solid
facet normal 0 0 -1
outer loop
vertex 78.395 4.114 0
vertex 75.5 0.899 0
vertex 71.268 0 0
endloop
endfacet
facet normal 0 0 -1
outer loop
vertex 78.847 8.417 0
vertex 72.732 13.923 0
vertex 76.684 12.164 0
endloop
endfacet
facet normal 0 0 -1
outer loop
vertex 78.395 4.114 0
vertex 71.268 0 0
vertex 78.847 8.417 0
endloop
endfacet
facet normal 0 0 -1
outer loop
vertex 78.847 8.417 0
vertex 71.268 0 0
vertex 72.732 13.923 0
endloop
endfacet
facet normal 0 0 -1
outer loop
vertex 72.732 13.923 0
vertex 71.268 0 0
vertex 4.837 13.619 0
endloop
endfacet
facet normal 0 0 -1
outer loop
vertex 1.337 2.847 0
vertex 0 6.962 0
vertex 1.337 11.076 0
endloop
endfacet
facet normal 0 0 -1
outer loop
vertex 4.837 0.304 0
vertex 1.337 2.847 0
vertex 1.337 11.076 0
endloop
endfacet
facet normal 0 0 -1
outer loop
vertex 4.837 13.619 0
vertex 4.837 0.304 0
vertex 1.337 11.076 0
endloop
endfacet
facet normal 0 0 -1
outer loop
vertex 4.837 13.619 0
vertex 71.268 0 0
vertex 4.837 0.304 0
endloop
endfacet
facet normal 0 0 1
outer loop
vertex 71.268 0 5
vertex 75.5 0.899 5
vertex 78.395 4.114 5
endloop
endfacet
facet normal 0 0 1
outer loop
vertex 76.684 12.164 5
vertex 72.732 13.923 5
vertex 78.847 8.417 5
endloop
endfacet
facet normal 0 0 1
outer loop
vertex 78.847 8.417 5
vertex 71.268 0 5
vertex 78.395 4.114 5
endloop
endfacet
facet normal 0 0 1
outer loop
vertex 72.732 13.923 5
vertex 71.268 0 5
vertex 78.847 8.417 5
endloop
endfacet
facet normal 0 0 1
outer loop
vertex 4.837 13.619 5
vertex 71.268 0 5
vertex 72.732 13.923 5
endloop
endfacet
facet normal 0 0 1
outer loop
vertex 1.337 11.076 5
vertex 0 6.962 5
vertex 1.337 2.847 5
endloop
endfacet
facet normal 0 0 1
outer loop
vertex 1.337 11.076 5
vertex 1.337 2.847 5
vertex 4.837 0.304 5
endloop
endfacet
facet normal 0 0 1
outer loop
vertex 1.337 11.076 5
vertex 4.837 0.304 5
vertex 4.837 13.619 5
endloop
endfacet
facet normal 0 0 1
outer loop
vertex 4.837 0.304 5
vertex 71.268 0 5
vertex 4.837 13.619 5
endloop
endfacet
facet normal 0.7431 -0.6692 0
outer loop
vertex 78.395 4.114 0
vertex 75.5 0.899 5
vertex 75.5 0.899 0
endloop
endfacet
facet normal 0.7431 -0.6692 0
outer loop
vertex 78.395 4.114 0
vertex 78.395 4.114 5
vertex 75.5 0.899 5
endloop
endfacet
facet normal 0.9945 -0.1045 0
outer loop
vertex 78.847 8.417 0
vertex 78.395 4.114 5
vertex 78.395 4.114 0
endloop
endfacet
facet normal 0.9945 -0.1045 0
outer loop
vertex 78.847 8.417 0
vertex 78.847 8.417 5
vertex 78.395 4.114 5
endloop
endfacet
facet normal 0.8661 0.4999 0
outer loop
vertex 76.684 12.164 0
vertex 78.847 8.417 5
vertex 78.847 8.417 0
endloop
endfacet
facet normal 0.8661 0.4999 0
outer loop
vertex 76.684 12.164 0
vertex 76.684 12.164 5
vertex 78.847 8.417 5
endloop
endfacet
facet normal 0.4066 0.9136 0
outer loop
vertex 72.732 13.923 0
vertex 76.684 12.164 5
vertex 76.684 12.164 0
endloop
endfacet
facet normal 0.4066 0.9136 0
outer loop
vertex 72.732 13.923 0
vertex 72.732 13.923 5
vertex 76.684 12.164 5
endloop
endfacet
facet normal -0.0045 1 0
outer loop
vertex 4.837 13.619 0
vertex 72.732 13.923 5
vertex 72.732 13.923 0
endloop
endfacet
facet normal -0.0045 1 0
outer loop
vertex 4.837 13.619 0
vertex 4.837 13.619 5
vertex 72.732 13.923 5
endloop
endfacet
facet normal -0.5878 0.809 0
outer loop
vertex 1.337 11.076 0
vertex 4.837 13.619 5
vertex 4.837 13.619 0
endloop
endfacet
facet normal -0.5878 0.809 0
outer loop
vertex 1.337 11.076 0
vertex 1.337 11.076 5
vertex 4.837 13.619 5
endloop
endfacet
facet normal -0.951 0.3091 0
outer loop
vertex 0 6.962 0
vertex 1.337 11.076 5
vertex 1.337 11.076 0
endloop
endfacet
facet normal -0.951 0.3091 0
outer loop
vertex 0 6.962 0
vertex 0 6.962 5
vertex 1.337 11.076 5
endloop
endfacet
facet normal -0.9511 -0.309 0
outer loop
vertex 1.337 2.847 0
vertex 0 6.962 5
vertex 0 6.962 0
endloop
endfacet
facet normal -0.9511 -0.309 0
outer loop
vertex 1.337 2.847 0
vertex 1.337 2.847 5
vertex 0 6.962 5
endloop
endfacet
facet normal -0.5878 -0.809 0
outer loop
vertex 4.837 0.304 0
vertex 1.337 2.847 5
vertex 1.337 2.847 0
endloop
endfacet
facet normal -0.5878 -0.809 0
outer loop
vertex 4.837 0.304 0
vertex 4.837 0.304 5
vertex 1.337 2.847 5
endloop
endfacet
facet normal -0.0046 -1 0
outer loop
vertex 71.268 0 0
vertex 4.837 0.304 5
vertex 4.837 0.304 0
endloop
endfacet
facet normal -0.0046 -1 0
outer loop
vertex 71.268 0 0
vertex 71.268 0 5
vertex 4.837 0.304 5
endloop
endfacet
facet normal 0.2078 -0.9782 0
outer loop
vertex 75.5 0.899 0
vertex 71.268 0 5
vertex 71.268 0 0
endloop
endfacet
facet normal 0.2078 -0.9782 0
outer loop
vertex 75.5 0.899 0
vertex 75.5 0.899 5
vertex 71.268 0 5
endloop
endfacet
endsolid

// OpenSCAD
$fn = 32;

// ----------------------------------------------------------------------
// Lever arm: two bosses 14 and 14 mm, 65 mm between centres
// ----------------------------------------------------------------------

// --- parameters (mm) ---
profile_height = 5;       // extrusion height
profile_points = 11;      // points of the closed outline

profile = [[0, 6.962], [1.337, 2.847], [4.837, 0.304], [71.268, 0], [75.5, 0.899], [78.395, 4.114], [78.847, 8.417], [76.684, 12.164], [72.732, 13.923], [4.837, 13.619], [1.337, 11.076]];  // single closed polygon, 11 points, counter clockwise

// --- the one profile operation ---
linear_extrude(height = profile_height) polygon(points = profile);
